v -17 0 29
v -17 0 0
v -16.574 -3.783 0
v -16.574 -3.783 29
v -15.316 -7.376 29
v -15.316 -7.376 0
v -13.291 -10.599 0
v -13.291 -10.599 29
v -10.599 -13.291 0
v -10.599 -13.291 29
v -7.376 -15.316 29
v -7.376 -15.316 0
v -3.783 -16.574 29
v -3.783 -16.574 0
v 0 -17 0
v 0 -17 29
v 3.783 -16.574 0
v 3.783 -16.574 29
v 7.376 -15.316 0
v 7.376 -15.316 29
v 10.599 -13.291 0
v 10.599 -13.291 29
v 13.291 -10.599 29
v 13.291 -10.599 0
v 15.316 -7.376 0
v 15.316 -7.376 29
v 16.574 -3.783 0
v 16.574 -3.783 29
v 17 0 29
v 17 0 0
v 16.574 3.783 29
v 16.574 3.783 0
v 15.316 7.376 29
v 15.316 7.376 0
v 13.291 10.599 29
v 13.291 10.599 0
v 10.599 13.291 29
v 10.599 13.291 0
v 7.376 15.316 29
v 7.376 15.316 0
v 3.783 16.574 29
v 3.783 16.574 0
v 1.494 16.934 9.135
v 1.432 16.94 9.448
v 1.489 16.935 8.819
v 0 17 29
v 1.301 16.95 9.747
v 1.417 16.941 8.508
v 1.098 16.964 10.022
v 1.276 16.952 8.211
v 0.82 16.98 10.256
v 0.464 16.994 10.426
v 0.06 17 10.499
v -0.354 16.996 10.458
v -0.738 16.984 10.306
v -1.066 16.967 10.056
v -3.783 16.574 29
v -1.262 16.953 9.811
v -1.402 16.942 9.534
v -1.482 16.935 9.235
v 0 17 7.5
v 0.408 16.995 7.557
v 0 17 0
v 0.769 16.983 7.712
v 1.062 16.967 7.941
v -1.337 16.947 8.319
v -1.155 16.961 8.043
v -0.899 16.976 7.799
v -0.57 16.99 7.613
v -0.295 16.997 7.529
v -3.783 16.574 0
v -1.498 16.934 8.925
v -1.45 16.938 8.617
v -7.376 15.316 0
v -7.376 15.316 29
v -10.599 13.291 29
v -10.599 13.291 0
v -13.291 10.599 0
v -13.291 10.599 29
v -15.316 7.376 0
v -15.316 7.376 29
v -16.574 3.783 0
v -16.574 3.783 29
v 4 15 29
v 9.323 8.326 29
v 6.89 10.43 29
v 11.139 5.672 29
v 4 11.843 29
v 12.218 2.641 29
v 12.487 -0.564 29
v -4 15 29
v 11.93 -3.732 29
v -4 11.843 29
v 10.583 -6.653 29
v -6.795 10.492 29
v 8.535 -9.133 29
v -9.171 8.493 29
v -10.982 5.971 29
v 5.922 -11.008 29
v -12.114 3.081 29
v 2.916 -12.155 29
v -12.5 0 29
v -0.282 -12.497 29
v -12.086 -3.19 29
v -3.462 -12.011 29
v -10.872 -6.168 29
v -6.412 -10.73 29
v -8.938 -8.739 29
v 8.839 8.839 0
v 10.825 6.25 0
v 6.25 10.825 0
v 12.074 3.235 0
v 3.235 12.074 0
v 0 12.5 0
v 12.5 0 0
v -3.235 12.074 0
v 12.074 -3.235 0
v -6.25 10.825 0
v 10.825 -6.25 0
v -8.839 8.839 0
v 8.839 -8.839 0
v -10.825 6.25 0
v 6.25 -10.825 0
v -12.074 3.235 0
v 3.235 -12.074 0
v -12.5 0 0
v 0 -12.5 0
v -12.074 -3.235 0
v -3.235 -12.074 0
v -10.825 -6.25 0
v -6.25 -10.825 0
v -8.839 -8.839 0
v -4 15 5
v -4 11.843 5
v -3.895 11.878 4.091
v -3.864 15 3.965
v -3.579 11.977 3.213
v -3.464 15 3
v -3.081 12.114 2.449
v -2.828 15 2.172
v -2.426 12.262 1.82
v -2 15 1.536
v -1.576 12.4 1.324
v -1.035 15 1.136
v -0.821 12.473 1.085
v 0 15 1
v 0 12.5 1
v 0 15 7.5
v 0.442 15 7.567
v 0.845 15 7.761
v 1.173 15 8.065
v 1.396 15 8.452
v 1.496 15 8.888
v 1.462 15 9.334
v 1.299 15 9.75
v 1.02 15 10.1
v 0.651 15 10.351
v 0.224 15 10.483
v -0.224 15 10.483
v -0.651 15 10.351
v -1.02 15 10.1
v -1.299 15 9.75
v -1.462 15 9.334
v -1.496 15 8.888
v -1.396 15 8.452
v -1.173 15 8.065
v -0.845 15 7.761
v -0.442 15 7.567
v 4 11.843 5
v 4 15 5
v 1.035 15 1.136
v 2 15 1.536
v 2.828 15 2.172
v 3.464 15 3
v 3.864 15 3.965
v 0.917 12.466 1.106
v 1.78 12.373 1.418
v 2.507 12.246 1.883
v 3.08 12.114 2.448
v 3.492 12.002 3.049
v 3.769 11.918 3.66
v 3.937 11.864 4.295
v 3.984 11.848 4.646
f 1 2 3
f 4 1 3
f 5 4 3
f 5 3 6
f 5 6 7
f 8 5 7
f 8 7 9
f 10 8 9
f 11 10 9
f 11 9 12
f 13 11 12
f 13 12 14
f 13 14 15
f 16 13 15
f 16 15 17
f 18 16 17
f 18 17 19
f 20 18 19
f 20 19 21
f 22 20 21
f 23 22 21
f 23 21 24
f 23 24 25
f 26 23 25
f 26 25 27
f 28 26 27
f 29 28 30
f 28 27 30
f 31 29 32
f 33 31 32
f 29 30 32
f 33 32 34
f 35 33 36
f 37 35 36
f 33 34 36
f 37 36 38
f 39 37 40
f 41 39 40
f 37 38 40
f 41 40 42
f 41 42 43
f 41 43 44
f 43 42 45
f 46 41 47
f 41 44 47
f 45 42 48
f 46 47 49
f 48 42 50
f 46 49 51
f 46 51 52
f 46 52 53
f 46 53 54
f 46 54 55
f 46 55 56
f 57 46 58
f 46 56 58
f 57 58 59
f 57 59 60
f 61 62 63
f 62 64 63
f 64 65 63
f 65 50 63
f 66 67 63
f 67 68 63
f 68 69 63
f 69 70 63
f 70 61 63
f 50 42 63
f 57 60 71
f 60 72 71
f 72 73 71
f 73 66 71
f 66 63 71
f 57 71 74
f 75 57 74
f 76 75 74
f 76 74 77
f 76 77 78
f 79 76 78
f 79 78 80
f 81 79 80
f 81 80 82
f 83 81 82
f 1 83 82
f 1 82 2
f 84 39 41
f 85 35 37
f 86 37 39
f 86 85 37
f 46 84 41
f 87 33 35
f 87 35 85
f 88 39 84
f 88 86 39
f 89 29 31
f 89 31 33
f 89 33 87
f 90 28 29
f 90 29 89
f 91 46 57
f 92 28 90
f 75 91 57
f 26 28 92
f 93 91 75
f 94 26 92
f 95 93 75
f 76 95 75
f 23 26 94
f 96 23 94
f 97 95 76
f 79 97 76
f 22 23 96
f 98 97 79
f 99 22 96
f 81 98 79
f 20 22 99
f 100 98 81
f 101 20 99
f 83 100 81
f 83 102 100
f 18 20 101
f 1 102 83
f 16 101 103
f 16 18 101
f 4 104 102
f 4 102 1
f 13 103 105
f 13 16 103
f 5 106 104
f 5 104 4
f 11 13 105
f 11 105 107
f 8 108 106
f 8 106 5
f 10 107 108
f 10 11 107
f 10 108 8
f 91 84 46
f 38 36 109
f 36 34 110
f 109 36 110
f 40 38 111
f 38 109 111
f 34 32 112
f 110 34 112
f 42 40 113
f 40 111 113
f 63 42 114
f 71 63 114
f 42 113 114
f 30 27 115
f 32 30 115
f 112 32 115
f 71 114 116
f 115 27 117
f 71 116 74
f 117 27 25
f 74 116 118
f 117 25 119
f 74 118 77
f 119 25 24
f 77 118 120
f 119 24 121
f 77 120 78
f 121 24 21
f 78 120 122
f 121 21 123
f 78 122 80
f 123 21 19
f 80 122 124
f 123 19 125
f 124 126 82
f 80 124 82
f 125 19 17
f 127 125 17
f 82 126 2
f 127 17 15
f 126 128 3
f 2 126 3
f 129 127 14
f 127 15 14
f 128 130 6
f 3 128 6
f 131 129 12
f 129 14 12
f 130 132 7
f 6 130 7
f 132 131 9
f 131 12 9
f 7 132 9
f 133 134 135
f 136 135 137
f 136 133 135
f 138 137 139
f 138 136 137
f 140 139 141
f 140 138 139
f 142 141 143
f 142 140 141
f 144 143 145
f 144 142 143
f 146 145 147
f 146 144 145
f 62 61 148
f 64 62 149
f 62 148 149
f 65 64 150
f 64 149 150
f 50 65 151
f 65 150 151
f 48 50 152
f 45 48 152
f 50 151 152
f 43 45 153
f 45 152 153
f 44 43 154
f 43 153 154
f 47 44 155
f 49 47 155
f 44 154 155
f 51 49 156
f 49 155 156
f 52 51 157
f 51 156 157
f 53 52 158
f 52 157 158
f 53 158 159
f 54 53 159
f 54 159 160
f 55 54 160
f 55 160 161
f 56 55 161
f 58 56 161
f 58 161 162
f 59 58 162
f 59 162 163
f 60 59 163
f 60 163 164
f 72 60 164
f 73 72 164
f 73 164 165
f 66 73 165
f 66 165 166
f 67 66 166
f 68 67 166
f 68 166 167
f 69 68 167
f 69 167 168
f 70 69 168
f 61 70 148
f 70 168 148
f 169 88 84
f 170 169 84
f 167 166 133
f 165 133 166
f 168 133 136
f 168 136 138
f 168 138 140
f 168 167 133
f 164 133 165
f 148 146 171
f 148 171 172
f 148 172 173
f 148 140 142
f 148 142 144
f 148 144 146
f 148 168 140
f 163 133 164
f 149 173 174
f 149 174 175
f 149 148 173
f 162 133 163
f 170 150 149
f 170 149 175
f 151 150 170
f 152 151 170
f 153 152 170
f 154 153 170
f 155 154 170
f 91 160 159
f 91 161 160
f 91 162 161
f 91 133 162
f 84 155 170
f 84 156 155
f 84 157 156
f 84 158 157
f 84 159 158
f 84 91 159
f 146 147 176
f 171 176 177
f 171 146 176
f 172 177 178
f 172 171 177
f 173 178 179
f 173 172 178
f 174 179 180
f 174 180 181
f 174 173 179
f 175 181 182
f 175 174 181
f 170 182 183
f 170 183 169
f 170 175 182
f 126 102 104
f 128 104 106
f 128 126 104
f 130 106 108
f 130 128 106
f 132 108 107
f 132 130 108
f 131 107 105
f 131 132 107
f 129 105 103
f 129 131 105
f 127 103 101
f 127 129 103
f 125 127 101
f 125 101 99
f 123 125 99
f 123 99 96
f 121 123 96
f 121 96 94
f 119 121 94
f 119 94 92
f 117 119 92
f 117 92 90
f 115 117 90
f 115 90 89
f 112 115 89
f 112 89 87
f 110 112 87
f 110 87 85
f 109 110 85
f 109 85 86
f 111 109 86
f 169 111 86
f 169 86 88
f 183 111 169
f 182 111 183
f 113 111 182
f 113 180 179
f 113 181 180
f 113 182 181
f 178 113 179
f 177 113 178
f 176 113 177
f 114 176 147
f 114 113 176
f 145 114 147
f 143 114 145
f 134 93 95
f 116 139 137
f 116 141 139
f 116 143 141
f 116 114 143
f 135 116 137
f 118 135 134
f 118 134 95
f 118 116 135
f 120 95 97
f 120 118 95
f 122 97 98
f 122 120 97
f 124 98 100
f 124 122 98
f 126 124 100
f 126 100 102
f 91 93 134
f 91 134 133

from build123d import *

# Parameters (mm, degrees)
SKETCH1_R           = 17
SKETCH1_R_2         = 12.5
BOSS_EXTRUDE1_DEPTH = 29
SKETCH2_W           = 8
SKETCH2_H           = 5
CUT_EXTRUDE2_DEPTH  = 28
FILLET3_R           = 4
FILLET4_R           = 4
SKETCH3_R           = 1.5
CUT_EXTRUDE4_DEPTH  = 47.411205606


with BuildPart() as part:
    # Sketch1 → Boss-Extrude1 (new body)
    with BuildSketch(Plane.XY):
        with Locations(Location((0, 0, 0), (0, 0, 180))):
            Circle(SKETCH1_R)
        with Locations(Location((0, 0, 0), (0, 0, 180))):
            Circle(SKETCH1_R_2, mode=Mode.SUBTRACT)
    extrude(amount=BOSS_EXTRUDE1_DEPTH)

    # Sketch2 → Cut-Extrude2 (cut)
    with BuildSketch(Plane.XY.offset(29)):
        with Locations((0, 12.5)):
            Rectangle(SKETCH2_W, SKETCH2_H)
    extrude(amount=-CUT_EXTRUDE2_DEPTH, mode=Mode.SUBTRACT)

    # Fillet3
    fillet3_edges = [part.edges().sort_by_distance(p)[0] for p in [
        (-4, 13.421359641, 1),
    ]]
    fillet(fillet3_edges, radius=FILLET3_R)

    # Fillet4
    fillet4_edges = [part.edges().sort_by_distance(p)[0] for p in [
        (4, 13.421359641, 1),
    ]]
    fillet(fillet4_edges, radius=FILLET4_R - 0.0001)  # a hair under: the kernel refuses the full size

    # Sketch3 → Cut-Extrude4 (cut, through all)
    with BuildSketch(Plane(origin=(0, 15, 0), x_dir=(-1, 0, 0), z_dir=(0, -1, 0))):
        with Locations(Location((0, -9, 0), (0, 0, 90))):
            Circle(SKETCH3_R)
    extrude(amount=-CUT_EXTRUDE4_DEPTH, mode=Mode.SUBTRACT)


solid = part.part
